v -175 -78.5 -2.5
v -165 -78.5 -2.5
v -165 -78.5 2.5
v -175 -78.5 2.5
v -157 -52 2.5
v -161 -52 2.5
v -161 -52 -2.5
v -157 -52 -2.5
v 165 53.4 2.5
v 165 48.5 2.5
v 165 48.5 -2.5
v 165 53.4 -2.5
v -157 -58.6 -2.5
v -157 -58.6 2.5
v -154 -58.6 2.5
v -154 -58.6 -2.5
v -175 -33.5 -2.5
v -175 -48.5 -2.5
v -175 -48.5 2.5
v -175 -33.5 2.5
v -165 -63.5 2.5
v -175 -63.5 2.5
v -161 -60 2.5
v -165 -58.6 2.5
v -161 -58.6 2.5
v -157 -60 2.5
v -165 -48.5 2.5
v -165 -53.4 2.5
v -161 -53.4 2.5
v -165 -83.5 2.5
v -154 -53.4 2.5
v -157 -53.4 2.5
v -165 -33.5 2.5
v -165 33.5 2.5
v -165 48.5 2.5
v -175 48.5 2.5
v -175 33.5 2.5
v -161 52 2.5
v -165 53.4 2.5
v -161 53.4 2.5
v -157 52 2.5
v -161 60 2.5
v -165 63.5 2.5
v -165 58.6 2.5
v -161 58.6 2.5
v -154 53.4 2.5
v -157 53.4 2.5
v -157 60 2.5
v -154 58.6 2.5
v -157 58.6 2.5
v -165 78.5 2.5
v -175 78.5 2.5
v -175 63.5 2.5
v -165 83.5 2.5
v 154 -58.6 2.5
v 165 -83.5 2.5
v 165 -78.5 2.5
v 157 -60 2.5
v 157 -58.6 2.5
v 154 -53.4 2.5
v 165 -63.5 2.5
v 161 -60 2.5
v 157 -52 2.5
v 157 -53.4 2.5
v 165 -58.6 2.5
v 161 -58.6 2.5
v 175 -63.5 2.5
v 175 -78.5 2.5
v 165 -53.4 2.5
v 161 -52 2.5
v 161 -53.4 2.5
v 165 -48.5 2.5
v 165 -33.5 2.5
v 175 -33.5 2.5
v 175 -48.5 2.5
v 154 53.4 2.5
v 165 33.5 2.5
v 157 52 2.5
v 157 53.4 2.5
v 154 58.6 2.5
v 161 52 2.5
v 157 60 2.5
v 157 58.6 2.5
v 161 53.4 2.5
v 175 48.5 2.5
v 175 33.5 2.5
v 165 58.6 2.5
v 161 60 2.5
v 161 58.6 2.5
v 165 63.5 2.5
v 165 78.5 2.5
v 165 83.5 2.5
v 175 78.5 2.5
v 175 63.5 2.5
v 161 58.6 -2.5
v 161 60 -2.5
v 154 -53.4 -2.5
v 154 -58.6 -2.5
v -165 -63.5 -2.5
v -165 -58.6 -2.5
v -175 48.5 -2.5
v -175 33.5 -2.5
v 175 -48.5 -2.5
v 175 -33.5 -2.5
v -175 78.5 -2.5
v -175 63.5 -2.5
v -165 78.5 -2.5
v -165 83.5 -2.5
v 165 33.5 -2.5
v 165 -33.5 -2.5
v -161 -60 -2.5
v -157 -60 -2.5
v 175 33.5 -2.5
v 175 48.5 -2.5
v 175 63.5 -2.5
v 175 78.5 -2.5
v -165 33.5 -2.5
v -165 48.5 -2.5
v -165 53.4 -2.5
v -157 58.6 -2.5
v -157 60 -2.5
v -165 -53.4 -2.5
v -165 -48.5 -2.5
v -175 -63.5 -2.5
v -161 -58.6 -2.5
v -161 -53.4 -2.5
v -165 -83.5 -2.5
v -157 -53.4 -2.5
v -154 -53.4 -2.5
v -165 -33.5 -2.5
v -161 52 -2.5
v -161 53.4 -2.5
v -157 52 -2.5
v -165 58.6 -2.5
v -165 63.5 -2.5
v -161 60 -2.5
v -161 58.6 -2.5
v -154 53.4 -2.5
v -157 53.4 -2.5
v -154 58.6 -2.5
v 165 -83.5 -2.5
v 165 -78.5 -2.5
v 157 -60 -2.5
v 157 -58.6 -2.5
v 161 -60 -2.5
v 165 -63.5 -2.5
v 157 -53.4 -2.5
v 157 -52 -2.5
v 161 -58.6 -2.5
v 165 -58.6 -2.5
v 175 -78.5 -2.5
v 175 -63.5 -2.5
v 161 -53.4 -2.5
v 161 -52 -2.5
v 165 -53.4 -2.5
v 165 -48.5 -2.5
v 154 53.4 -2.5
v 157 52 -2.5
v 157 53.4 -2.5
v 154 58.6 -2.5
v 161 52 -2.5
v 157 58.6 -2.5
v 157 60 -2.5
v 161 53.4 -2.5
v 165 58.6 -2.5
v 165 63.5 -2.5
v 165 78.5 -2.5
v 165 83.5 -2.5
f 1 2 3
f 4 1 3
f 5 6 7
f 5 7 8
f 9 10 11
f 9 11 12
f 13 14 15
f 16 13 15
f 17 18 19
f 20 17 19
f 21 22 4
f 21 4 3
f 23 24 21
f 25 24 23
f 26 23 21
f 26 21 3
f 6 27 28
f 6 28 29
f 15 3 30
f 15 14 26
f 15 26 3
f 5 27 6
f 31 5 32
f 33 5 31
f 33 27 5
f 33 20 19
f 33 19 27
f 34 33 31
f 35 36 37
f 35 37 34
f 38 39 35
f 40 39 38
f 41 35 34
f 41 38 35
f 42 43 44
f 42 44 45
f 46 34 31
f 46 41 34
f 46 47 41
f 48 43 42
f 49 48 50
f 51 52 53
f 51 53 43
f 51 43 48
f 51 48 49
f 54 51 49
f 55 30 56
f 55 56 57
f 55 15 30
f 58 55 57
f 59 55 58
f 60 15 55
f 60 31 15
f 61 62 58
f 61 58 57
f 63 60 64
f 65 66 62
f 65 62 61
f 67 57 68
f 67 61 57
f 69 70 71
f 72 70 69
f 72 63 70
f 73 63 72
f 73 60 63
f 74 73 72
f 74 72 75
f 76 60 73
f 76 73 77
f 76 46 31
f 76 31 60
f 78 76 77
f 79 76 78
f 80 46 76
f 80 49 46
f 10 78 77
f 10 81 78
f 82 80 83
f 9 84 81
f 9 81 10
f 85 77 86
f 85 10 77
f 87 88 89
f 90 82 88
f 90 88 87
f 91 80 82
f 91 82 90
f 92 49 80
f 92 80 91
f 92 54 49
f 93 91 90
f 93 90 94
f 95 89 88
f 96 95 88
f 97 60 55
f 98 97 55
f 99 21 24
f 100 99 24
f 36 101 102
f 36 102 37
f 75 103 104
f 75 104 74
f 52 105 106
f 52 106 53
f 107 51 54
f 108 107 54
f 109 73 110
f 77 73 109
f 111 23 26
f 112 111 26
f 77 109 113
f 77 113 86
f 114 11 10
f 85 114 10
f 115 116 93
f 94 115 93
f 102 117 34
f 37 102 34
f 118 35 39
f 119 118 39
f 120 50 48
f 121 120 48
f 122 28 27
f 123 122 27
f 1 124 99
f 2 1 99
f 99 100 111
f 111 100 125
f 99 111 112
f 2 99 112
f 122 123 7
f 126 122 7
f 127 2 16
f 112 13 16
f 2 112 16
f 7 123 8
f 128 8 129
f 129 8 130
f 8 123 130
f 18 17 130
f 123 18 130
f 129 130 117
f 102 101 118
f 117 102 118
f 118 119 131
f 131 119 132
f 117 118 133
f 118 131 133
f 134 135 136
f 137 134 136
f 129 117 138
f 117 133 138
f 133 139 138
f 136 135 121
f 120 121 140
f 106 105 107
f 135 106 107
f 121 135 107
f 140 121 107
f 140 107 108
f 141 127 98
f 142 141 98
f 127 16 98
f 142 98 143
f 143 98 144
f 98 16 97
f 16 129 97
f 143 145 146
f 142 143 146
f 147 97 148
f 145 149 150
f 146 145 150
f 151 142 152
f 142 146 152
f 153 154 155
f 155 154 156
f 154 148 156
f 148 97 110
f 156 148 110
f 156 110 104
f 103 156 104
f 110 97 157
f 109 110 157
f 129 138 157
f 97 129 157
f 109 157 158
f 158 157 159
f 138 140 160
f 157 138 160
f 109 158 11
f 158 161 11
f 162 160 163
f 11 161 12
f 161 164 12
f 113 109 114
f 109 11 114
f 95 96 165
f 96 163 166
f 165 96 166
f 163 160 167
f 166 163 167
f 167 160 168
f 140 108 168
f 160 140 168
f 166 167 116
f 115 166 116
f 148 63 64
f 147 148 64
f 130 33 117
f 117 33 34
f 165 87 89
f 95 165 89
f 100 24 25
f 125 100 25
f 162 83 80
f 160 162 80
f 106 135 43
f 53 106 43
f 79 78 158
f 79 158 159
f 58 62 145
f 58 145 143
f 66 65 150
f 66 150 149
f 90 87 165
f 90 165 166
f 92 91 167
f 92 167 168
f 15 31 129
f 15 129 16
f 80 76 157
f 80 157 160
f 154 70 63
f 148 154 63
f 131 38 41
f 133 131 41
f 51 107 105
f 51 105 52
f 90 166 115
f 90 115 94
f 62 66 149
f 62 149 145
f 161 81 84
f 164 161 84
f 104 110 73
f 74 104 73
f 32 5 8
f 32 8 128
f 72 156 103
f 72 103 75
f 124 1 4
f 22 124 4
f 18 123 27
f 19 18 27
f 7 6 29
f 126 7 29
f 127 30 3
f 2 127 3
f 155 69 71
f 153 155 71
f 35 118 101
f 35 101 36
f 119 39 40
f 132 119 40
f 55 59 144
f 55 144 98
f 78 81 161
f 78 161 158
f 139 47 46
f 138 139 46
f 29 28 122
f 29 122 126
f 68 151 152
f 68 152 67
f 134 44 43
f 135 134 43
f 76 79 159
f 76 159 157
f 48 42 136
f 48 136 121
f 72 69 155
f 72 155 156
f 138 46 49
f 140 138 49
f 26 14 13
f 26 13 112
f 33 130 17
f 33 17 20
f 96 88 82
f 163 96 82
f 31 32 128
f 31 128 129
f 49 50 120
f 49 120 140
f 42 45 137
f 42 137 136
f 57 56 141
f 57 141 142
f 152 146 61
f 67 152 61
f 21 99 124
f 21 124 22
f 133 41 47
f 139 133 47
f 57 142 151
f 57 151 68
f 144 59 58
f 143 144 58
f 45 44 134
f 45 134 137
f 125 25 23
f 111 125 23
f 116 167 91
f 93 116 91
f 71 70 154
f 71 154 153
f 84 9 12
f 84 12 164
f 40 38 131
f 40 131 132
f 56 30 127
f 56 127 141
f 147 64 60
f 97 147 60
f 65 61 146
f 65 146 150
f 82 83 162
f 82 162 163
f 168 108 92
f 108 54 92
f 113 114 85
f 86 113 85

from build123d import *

# Parameters (mm, degrees)
SKETCH1_W               = 330
SKETCH1_H               = 167
BOSS_EXTRUDE1_DEPTH     = 2.5
SKETCH2_W               = 5
SKETCH2_H               = 15
BOSS_EXTRUDE2_DEPTH     = 10
SKETCH4_W               = 11
SKETCH4_H               = 5.2
CUT_EXTRUDE1_DEPTH      = 6
SKETCH5_W               = 4
SKETCH5_H               = 8
CUT_EXTRUDE2_DEPTH      = 6
MIRROR2_COPY_1_SKETCH_W = 5
MIRROR2_COPY_1_SKETCH_H = 15
MIRROR2_COPY_1_DEPTH    = 10
MIRROR2_COPY_2_SKETCH_W = 11
MIRROR2_COPY_2_SKETCH_H = 5.2
MIRROR2_COPY_2_DEPTH    = 6
MIRROR2_COPY_3_SKETCH_W = 4
MIRROR2_COPY_3_SKETCH_H = 8
MIRROR2_COPY_3_DEPTH    = 6


with BuildPart() as part:
    # Sketch1 → Boss-Extrude1 (new body, symmetric)
    with BuildSketch(Plane.XY):
        Rectangle(SKETCH1_W, SKETCH1_H)
    extrude(amount=BOSS_EXTRUDE1_DEPTH, both=True)

    # Sketch2 → Boss-Extrude2 (add)
    with BuildSketch(Plane.ZY.offset(165)):
        with Locations((0, 71)):
            Rectangle(SKETCH2_W, SKETCH2_H)
        with Locations((0, 41)):
            Rectangle(SKETCH2_W, SKETCH2_H)
    boss_extrude2 = extrude(amount=BOSS_EXTRUDE2_DEPTH)

    # Sketch4 → Cut-Extrude1 (cut, through all)
    with BuildSketch(Plane.XY.offset(2.5)):
        with Locations((-159.5, 56)):
            Rectangle(SKETCH4_W, SKETCH4_H)
    cut_extrude1 = extrude(amount=-CUT_EXTRUDE1_DEPTH, mode=Mode.SUBTRACT)

    # Sketch5 → Cut-Extrude2 (cut, through all)
    with BuildSketch(Plane.XY.offset(2.5)):
        with Locations((-159, 56)):
            Rectangle(SKETCH5_W, SKETCH5_H)
    cut_extrude2 = extrude(amount=-CUT_EXTRUDE2_DEPTH, mode=Mode.SUBTRACT)

    # Mirror1: Boss-Extrude2, Cut-Extrude1, Cut-Extrude2 across plane
    add(boss_extrude2.mirror(Plane.ZX))
    add(cut_extrude1.mirror(Plane.ZX), mode=Mode.SUBTRACT)
    add(cut_extrude2.mirror(Plane.ZX), mode=Mode.SUBTRACT)

    # Mirror2: Boss-Extrude2, Cut-Extrude1, Cut-Extrude2 across plane
    add(boss_extrude2.mirror(Plane(origin=(0, 0, 0), x_dir=(0, 0, 1), z_dir=(1, 0, 0))))
    add(cut_extrude1.mirror(Plane(origin=(0, 0, 0), x_dir=(0, 0, 1), z_dir=(1, 0, 0))), mode=Mode.SUBTRACT)
    add(cut_extrude2.mirror(Plane(origin=(0, 0, 0), x_dir=(0, 0, 1), z_dir=(1, 0, 0))), mode=Mode.SUBTRACT)

    # Mirror2 copy 1 sketch → Mirror2 copy 1 (add)
    with BuildSketch(Plane(origin=(165, 0, 0), x_dir=(0, 0, 1), z_dir=(1, 0, 0))):
        with Locations((0, 71)):
            Rectangle(MIRROR2_COPY_1_SKETCH_W, MIRROR2_COPY_1_SKETCH_H)
        with Locations((0, 41)):
            Rectangle(MIRROR2_COPY_1_SKETCH_W, MIRROR2_COPY_1_SKETCH_H)
    extrude(amount=MIRROR2_COPY_1_DEPTH)

    # Mirror2 copy 2 sketch → Mirror2 copy 2 (cut, through all)
    with BuildSketch(Plane(origin=(0, 0, 2.5), x_dir=(-1, 0, 0), z_dir=(0, 0, 1))):
        with Locations((-159.5, 56)):
            Rectangle(MIRROR2_COPY_2_SKETCH_W, MIRROR2_COPY_2_SKETCH_H)
    extrude(amount=-MIRROR2_COPY_2_DEPTH, mode=Mode.SUBTRACT)

    # Mirror2 copy 3 sketch → Mirror2 copy 3 (cut, through all)
    with BuildSketch(Plane(origin=(0, 0, 2.5), x_dir=(-1, 0, 0), z_dir=(0, 0, 1))):
        with Locations((-159, 56)):
            Rectangle(MIRROR2_COPY_3_SKETCH_W, MIRROR2_COPY_3_SKETCH_H)
    extrude(amount=-MIRROR2_COPY_3_DEPTH, mode=Mode.SUBTRACT)


solid = part.part
